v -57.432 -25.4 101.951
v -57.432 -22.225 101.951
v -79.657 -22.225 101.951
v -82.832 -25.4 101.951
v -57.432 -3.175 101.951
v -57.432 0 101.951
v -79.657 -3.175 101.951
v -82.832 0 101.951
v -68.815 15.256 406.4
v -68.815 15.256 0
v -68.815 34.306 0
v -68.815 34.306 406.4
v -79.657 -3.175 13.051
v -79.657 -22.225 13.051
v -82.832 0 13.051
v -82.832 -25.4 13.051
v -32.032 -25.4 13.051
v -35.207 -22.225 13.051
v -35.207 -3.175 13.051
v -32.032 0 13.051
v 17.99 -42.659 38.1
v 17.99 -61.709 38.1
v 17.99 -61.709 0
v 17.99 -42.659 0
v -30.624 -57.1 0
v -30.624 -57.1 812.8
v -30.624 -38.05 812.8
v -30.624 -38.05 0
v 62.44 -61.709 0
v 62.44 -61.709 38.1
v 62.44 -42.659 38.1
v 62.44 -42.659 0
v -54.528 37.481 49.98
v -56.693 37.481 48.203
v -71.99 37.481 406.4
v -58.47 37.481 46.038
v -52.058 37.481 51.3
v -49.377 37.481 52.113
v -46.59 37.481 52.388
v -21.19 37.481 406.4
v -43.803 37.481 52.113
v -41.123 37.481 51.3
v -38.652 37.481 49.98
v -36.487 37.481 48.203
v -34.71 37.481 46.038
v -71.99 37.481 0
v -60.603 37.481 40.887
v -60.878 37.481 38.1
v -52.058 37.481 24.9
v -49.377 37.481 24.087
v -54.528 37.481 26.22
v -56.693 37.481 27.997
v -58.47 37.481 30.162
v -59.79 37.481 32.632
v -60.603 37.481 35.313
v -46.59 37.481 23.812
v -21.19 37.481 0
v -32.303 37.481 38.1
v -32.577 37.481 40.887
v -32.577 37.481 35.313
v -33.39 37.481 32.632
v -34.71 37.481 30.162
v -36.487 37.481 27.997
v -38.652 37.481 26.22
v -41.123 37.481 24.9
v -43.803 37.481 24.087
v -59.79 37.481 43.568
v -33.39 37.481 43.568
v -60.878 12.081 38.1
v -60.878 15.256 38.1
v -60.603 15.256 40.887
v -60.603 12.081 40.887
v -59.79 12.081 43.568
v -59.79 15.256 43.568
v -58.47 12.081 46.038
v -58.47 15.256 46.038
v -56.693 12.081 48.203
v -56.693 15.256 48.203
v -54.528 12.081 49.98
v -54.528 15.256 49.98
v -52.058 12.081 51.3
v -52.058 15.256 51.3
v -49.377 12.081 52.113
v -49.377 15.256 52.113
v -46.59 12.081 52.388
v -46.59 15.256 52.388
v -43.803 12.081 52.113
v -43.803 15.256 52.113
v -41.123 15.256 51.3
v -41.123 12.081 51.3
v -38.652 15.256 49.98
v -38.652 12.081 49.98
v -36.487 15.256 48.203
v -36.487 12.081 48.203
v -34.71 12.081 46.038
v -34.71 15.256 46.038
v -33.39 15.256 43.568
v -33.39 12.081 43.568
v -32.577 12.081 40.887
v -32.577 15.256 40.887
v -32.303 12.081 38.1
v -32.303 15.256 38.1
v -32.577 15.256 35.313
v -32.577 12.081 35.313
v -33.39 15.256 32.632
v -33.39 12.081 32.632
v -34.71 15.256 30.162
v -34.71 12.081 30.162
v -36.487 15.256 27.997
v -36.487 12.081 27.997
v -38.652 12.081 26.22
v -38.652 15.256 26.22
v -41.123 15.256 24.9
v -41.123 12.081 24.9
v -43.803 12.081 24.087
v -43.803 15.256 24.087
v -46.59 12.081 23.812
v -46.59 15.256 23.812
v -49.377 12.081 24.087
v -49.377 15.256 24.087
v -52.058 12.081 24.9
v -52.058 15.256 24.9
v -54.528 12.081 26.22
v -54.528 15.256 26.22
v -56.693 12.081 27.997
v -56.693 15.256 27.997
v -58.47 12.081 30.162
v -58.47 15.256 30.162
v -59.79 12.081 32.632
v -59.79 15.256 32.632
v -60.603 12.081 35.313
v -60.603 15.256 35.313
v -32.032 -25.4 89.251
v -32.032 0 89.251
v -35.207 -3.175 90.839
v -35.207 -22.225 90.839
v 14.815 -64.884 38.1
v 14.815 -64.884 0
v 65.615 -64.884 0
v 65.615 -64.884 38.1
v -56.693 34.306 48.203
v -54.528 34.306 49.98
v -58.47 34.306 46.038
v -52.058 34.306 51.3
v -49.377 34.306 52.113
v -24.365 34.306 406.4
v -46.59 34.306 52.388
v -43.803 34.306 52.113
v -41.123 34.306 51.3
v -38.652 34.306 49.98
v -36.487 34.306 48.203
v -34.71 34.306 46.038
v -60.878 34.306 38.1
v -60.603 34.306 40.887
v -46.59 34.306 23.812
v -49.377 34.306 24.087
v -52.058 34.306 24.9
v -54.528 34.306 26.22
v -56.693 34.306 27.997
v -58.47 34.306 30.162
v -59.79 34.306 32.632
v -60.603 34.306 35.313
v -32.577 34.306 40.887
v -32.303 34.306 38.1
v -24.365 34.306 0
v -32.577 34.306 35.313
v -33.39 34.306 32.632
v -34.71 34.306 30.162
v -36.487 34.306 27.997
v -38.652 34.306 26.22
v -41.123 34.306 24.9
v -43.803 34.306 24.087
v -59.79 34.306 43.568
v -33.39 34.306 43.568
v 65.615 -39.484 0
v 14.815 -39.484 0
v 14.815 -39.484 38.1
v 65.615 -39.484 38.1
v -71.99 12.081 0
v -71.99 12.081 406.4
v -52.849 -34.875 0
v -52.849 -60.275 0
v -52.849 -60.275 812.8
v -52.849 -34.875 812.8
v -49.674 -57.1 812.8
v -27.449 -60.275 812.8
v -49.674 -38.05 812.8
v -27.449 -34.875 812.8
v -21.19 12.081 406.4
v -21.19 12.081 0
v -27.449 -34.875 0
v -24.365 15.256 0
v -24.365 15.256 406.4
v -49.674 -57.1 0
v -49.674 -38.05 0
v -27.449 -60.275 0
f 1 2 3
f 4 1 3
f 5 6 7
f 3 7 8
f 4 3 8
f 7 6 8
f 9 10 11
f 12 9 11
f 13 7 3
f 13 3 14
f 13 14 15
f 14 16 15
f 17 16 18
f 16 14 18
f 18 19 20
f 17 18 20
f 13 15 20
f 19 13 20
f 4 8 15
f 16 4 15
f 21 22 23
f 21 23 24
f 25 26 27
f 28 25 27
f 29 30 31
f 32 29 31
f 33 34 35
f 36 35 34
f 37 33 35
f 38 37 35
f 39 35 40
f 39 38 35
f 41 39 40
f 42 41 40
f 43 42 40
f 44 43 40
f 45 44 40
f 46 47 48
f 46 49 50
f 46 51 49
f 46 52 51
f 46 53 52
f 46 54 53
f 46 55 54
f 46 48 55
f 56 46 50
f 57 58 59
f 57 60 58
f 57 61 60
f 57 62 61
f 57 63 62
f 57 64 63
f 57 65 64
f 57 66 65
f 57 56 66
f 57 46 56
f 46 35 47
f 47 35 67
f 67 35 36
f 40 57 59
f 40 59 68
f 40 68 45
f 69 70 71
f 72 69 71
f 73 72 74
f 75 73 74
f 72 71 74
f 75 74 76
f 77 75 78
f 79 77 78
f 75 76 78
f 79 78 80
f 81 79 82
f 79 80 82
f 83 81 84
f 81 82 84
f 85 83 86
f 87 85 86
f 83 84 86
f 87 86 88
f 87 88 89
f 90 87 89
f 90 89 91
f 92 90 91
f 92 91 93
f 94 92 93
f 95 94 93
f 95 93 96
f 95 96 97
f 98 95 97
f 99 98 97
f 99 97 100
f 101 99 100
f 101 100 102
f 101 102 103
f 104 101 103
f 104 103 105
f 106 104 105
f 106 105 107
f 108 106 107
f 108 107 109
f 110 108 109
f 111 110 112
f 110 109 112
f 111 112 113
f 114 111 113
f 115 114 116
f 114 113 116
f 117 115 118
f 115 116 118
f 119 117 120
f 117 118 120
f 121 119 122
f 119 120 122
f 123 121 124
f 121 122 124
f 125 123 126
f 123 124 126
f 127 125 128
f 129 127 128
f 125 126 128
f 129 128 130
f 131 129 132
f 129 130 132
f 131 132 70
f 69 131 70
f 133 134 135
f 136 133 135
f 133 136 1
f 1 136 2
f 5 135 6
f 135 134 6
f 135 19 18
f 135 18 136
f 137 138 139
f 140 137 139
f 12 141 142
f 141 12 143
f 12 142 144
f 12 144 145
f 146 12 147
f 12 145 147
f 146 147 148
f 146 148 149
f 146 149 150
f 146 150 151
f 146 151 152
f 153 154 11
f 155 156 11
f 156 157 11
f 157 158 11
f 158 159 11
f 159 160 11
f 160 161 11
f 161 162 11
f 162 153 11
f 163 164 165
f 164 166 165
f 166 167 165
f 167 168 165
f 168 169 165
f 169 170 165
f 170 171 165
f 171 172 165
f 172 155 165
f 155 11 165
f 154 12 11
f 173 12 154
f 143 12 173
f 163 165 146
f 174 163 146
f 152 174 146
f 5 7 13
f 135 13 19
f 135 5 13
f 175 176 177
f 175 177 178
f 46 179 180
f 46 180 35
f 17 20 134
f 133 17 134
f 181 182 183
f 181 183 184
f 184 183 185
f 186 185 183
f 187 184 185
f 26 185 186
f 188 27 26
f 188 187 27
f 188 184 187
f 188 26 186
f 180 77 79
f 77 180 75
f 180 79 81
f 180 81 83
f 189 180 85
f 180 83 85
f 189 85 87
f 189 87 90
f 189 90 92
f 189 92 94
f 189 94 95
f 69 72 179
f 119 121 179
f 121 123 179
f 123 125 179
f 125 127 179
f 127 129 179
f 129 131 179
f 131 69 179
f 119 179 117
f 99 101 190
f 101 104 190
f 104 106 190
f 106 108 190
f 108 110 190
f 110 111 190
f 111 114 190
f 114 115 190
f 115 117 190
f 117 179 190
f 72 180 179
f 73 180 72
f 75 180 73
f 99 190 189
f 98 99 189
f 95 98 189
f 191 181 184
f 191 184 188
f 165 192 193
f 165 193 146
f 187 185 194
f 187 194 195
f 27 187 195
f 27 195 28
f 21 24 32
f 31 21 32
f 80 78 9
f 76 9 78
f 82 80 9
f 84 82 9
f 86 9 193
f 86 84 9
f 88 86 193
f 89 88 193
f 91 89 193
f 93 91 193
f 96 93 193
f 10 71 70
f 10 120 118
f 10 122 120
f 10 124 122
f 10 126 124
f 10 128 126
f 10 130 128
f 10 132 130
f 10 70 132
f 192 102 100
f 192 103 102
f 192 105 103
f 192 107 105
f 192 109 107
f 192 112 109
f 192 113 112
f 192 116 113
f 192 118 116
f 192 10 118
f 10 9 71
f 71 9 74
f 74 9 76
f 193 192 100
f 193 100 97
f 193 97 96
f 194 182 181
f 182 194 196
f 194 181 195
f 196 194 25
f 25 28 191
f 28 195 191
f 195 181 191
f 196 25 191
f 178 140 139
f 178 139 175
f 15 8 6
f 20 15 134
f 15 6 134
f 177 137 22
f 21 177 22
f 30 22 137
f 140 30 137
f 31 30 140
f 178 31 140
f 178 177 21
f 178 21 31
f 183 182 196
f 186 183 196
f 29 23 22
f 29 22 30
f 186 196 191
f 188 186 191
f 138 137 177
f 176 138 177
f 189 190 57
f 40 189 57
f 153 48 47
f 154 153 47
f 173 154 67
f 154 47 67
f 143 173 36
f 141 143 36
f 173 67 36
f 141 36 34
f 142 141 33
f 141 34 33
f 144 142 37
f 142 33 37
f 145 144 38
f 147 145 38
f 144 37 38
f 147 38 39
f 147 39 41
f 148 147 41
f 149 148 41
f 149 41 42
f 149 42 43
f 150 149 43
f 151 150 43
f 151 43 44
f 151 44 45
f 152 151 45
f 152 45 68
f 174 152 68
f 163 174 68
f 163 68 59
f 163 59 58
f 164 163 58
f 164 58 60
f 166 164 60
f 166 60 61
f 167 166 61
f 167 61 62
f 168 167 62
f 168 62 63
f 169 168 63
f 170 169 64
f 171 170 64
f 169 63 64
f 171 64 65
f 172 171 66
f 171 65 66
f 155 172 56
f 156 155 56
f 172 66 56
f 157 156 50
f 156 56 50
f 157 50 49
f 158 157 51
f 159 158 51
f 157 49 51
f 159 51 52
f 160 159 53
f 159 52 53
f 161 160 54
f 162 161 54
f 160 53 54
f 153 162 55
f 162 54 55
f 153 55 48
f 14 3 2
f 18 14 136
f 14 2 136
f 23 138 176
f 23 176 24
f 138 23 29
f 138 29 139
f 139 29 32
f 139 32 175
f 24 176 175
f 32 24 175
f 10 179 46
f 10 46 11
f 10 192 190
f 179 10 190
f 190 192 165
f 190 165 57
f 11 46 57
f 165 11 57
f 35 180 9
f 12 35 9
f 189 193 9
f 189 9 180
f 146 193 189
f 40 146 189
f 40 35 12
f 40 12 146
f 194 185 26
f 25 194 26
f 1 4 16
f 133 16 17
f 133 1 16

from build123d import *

# Parameters (mm, degrees)
F1_DEPTH  = 25.4
F2_T      = -3.175
F3_W      = 25.4
F3_H      = 25.4
F4_DEPTH  = 812.8
F5_T      = -3.175
F6_W      = 50.8
F6_H      = 25.4
F7_DEPTH  = 38.1
F8_T      = -3.175
F9_W      = 50.8
F9_H      = 25.4
F10_DEPTH = 406.4
F11_T     = -3.175
F12_R     = 14.2875
F13_DEPTH = 25.4


with BuildPart() as f1:
    # F0 (on Front) → F1 (new body)
    with BuildSketch(Plane.XZ):
        Polygon((-57.431955, 101.951429), (-82.831955, 101.951429), (-82.831955, 13.051429), (-32.031955, 13.051429), (-32.031955, 89.251429), align=None)
    extrude(amount=F1_DEPTH)

    # F2
    f2_openings = [f1.faces().sort_by_distance(p)[0] for p in [
        (-44.731955, -12.7, 95.601429),
        (-70.131955, -12.7, 101.951429),
        (-57.431955, -12.7, 13.051429),
    ]]
    offset(amount=F2_T, openings=f2_openings)


with BuildPart() as f4:
    # F3 (on Top) → F4 (new body)
    with BuildSketch(Plane.XY):
        with Locations((-40.149413, -47.575016)):
            Rectangle(F3_W, F3_H)
    extrude(amount=F4_DEPTH)

    # F5
    f5_openings = [f4.faces().sort_by_distance(p)[0] for p in [
        (-40.149413, -47.575016, 812.8),
        (-40.149413, -47.575016, 0),
    ]]
    offset(amount=F5_T, openings=f5_openings)


with BuildPart() as f7:
    # F6 (on Top) → F7 (new body)
    with BuildSketch(Plane.XY):
        with Locations((40.215493, -52.18447)):
            Rectangle(F6_W, F6_H)
    extrude(amount=F7_DEPTH)

    # F8
    f8_openings = [f7.faces().sort_by_distance(p)[0] for p in [
        (40.215493, -52.18447, 38.1),
        (40.215493, -52.18447, 0),
    ]]
    offset(amount=F8_T, openings=f8_openings)


with BuildPart() as f10:
    # F9 (on Top) → F10 (new body)
    with BuildSketch(Plane.XY):
        with Locations((-46.590108, 24.780664)):
            Rectangle(F9_W, F9_H)
    extrude(amount=F10_DEPTH)

    # F11
    f11_openings = [f10.faces().sort_by_distance(p)[0] for p in [
        (-46.590108, 24.780664, 406.4),
        (-46.590108, 24.780664, 0),
    ]]
    offset(amount=F11_T, openings=f11_openings)

    # F12 (on face) → F13 (cut, through all)
    with BuildSketch(Plane(origin=(0, 37.480664, 0), x_dir=(-1, 0, 0), z_dir=(0, 1, 0))):
        with Locations((46.590108, 38.1)):
            Circle(F12_R)
    extrude(amount=-F13_DEPTH, mode=Mode.SUBTRACT)


solid = Compound([f1.part, f4.part, f7.part, f10.part])
